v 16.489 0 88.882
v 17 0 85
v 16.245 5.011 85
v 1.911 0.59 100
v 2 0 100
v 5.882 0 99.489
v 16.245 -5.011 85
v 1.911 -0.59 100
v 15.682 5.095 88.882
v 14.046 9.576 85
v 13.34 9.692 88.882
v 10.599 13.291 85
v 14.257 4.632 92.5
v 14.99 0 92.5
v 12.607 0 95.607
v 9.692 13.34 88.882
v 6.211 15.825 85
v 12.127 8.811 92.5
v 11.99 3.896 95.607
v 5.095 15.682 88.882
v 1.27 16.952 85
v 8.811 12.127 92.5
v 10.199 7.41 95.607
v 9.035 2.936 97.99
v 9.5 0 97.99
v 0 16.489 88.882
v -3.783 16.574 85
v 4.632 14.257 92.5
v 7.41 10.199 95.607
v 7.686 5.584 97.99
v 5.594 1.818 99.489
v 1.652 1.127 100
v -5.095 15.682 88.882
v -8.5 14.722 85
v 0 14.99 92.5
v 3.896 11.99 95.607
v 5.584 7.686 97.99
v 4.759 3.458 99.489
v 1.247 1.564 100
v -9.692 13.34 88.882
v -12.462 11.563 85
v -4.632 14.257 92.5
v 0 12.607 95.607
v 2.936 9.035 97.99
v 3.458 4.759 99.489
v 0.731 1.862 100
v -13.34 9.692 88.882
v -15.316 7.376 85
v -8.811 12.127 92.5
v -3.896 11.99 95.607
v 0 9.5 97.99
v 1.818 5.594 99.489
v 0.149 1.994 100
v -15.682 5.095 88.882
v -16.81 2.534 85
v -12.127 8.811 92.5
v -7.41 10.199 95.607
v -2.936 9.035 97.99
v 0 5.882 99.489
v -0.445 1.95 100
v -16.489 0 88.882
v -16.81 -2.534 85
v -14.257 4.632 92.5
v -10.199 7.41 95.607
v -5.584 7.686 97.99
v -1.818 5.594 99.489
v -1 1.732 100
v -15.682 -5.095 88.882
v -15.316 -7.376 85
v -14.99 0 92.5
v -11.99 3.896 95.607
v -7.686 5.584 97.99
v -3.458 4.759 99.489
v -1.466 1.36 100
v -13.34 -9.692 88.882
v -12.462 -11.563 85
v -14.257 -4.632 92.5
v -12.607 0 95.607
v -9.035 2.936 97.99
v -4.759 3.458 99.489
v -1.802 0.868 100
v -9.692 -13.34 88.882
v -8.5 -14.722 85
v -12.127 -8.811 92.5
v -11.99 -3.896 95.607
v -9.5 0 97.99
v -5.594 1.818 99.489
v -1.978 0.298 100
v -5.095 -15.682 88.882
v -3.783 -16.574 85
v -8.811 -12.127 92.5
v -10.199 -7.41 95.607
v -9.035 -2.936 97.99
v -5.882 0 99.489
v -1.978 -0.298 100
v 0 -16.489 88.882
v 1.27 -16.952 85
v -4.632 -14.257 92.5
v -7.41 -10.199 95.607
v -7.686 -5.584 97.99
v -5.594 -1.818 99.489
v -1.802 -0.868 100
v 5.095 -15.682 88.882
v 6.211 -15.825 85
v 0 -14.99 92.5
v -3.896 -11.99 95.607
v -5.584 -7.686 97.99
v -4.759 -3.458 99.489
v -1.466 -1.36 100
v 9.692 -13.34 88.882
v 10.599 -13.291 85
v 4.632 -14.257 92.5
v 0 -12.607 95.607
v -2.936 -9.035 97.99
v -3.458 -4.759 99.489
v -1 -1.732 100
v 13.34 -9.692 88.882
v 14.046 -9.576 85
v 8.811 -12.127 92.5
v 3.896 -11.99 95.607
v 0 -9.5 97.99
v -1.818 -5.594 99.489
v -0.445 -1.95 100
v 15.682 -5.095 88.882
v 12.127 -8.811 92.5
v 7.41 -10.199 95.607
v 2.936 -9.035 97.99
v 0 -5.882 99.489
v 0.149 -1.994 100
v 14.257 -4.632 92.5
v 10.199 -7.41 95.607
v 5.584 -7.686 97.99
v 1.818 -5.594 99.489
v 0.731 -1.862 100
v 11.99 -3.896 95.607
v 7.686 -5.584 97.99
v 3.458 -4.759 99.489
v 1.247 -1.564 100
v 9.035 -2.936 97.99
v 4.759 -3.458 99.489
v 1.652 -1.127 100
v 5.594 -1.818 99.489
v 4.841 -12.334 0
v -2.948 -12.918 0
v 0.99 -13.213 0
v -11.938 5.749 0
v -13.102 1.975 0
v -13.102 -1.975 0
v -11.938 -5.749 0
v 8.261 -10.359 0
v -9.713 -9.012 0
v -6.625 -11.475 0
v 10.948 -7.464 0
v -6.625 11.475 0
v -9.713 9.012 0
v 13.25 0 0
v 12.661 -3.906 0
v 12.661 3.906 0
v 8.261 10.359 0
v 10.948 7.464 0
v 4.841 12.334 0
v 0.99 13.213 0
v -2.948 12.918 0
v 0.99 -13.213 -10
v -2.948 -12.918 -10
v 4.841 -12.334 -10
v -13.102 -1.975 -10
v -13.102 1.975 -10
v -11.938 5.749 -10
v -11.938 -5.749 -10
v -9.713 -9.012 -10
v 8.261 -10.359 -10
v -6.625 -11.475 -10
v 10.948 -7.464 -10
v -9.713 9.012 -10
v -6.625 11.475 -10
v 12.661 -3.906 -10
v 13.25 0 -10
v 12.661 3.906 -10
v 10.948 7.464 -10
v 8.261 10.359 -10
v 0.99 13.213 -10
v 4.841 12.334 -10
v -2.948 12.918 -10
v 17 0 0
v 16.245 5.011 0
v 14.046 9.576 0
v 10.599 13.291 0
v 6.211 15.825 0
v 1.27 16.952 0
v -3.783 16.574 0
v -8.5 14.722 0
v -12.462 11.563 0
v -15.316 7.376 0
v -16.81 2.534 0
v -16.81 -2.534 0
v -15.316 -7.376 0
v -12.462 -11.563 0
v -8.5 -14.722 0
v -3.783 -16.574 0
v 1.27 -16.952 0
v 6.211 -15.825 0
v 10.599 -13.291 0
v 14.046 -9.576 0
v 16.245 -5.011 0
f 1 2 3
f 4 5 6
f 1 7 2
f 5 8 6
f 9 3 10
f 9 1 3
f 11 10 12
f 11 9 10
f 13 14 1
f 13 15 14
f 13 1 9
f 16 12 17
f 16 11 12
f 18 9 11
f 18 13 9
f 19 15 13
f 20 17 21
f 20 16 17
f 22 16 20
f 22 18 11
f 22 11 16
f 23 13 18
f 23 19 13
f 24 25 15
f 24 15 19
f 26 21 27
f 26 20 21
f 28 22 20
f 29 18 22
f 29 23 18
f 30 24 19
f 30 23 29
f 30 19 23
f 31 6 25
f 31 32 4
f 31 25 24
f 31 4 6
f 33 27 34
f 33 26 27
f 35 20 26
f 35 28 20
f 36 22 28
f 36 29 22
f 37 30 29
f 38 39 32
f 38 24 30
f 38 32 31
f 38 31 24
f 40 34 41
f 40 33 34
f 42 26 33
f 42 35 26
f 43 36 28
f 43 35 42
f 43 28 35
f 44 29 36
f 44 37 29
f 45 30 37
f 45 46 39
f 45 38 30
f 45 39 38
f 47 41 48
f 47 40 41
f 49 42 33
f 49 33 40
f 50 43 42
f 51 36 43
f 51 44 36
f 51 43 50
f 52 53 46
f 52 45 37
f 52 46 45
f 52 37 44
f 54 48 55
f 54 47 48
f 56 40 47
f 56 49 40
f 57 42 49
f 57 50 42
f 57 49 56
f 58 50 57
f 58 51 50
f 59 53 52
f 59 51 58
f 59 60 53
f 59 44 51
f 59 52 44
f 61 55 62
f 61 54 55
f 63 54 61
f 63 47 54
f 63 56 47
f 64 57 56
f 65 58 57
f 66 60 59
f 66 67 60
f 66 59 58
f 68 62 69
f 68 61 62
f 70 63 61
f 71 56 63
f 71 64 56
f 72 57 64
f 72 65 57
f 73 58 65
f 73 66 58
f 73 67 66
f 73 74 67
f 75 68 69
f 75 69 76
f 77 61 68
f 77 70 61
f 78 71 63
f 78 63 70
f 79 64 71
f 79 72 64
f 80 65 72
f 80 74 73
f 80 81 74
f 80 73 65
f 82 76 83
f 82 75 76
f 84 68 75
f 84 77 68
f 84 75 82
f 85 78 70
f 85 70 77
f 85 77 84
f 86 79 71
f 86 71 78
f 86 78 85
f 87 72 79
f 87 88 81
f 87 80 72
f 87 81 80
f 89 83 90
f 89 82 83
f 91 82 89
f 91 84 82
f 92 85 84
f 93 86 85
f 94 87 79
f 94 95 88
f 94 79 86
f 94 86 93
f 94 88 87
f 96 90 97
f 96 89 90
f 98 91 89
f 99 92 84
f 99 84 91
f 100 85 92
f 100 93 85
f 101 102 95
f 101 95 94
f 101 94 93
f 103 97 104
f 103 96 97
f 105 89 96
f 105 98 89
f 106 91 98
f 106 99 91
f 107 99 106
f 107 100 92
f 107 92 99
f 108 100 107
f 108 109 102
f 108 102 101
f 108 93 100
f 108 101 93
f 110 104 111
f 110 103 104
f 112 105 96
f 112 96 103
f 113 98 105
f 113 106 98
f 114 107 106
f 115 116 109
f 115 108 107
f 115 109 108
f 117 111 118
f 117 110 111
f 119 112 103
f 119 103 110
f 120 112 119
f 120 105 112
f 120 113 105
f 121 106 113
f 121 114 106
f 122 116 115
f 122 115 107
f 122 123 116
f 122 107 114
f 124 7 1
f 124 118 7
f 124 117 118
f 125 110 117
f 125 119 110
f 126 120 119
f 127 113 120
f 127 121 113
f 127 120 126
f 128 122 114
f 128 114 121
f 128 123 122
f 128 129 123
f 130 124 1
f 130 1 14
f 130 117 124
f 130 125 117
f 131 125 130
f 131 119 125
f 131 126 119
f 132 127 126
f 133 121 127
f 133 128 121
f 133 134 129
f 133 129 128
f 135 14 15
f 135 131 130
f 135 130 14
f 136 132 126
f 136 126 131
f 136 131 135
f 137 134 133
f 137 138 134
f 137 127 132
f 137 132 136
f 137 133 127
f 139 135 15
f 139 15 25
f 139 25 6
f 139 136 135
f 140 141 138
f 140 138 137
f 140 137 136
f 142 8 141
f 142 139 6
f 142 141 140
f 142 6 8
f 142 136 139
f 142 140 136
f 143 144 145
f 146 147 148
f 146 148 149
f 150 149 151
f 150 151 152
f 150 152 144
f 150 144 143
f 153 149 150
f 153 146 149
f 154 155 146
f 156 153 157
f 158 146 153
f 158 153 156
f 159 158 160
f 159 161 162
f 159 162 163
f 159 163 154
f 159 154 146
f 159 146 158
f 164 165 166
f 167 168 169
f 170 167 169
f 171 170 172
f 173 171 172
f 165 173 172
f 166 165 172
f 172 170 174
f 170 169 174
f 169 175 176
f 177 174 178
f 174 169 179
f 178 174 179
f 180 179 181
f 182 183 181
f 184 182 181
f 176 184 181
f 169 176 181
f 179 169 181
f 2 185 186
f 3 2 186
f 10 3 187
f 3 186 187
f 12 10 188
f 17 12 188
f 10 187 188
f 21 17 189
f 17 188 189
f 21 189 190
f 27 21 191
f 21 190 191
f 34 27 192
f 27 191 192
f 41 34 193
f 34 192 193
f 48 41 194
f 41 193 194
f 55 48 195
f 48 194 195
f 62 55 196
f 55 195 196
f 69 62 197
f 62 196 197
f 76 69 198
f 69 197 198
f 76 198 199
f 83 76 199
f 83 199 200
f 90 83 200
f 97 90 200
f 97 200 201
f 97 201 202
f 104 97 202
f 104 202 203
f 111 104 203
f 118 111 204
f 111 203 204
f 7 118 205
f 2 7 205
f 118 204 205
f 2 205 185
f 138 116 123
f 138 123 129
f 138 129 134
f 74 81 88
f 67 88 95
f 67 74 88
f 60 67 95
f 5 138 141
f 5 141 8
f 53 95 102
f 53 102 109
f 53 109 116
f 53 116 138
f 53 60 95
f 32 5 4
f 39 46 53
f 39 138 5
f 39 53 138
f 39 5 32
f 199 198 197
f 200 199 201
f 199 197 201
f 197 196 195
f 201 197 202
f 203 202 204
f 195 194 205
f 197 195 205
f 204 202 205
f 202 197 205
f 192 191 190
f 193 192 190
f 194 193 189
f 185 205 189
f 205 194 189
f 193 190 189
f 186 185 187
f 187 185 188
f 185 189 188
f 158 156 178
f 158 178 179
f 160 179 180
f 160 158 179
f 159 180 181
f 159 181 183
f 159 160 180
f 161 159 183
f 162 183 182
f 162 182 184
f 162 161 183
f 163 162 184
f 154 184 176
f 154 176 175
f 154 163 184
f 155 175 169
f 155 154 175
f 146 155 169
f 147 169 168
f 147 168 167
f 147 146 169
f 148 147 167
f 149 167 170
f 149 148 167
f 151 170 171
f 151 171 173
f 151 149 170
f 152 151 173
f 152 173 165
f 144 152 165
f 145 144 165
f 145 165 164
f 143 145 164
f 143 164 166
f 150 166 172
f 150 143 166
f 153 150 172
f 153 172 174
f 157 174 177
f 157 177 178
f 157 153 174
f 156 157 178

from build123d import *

# Parameters (mm, degrees)
F0_R     = 17
F0_R_2   = 13.25
F0_R_3   = 10.25
F1_DEPTH = 100
F2_DEPTH = 10
F3_R     = 15


with BuildPart() as f1:
    # F0 (on Top) → F1 (new body)
    with BuildSketch(Plane.XY):
        Circle(F0_R)
        Circle(F0_R_2, mode=Mode.SUBTRACT)
        Circle(F0_R_2)
        Circle(F0_R_3, mode=Mode.SUBTRACT)
        Circle(F0_R_3)
    extrude(amount=F1_DEPTH)

    # F3
    f3_edges = [f1.edges().sort_by_distance(p)[0] for p in [
        (-17, 0, 100),
    ]]
    fillet(f3_edges, radius=F3_R)


with BuildPart() as f2:
    # F0 (on Top) → F2 (new body)
    with BuildSketch(Plane.XY):
        Circle(F0_R_2)
        Circle(F0_R_3, mode=Mode.SUBTRACT)
        Circle(F0_R_3)
    extrude(amount=-F2_DEPTH)


solid = Compound([f1.part, f2.part])
